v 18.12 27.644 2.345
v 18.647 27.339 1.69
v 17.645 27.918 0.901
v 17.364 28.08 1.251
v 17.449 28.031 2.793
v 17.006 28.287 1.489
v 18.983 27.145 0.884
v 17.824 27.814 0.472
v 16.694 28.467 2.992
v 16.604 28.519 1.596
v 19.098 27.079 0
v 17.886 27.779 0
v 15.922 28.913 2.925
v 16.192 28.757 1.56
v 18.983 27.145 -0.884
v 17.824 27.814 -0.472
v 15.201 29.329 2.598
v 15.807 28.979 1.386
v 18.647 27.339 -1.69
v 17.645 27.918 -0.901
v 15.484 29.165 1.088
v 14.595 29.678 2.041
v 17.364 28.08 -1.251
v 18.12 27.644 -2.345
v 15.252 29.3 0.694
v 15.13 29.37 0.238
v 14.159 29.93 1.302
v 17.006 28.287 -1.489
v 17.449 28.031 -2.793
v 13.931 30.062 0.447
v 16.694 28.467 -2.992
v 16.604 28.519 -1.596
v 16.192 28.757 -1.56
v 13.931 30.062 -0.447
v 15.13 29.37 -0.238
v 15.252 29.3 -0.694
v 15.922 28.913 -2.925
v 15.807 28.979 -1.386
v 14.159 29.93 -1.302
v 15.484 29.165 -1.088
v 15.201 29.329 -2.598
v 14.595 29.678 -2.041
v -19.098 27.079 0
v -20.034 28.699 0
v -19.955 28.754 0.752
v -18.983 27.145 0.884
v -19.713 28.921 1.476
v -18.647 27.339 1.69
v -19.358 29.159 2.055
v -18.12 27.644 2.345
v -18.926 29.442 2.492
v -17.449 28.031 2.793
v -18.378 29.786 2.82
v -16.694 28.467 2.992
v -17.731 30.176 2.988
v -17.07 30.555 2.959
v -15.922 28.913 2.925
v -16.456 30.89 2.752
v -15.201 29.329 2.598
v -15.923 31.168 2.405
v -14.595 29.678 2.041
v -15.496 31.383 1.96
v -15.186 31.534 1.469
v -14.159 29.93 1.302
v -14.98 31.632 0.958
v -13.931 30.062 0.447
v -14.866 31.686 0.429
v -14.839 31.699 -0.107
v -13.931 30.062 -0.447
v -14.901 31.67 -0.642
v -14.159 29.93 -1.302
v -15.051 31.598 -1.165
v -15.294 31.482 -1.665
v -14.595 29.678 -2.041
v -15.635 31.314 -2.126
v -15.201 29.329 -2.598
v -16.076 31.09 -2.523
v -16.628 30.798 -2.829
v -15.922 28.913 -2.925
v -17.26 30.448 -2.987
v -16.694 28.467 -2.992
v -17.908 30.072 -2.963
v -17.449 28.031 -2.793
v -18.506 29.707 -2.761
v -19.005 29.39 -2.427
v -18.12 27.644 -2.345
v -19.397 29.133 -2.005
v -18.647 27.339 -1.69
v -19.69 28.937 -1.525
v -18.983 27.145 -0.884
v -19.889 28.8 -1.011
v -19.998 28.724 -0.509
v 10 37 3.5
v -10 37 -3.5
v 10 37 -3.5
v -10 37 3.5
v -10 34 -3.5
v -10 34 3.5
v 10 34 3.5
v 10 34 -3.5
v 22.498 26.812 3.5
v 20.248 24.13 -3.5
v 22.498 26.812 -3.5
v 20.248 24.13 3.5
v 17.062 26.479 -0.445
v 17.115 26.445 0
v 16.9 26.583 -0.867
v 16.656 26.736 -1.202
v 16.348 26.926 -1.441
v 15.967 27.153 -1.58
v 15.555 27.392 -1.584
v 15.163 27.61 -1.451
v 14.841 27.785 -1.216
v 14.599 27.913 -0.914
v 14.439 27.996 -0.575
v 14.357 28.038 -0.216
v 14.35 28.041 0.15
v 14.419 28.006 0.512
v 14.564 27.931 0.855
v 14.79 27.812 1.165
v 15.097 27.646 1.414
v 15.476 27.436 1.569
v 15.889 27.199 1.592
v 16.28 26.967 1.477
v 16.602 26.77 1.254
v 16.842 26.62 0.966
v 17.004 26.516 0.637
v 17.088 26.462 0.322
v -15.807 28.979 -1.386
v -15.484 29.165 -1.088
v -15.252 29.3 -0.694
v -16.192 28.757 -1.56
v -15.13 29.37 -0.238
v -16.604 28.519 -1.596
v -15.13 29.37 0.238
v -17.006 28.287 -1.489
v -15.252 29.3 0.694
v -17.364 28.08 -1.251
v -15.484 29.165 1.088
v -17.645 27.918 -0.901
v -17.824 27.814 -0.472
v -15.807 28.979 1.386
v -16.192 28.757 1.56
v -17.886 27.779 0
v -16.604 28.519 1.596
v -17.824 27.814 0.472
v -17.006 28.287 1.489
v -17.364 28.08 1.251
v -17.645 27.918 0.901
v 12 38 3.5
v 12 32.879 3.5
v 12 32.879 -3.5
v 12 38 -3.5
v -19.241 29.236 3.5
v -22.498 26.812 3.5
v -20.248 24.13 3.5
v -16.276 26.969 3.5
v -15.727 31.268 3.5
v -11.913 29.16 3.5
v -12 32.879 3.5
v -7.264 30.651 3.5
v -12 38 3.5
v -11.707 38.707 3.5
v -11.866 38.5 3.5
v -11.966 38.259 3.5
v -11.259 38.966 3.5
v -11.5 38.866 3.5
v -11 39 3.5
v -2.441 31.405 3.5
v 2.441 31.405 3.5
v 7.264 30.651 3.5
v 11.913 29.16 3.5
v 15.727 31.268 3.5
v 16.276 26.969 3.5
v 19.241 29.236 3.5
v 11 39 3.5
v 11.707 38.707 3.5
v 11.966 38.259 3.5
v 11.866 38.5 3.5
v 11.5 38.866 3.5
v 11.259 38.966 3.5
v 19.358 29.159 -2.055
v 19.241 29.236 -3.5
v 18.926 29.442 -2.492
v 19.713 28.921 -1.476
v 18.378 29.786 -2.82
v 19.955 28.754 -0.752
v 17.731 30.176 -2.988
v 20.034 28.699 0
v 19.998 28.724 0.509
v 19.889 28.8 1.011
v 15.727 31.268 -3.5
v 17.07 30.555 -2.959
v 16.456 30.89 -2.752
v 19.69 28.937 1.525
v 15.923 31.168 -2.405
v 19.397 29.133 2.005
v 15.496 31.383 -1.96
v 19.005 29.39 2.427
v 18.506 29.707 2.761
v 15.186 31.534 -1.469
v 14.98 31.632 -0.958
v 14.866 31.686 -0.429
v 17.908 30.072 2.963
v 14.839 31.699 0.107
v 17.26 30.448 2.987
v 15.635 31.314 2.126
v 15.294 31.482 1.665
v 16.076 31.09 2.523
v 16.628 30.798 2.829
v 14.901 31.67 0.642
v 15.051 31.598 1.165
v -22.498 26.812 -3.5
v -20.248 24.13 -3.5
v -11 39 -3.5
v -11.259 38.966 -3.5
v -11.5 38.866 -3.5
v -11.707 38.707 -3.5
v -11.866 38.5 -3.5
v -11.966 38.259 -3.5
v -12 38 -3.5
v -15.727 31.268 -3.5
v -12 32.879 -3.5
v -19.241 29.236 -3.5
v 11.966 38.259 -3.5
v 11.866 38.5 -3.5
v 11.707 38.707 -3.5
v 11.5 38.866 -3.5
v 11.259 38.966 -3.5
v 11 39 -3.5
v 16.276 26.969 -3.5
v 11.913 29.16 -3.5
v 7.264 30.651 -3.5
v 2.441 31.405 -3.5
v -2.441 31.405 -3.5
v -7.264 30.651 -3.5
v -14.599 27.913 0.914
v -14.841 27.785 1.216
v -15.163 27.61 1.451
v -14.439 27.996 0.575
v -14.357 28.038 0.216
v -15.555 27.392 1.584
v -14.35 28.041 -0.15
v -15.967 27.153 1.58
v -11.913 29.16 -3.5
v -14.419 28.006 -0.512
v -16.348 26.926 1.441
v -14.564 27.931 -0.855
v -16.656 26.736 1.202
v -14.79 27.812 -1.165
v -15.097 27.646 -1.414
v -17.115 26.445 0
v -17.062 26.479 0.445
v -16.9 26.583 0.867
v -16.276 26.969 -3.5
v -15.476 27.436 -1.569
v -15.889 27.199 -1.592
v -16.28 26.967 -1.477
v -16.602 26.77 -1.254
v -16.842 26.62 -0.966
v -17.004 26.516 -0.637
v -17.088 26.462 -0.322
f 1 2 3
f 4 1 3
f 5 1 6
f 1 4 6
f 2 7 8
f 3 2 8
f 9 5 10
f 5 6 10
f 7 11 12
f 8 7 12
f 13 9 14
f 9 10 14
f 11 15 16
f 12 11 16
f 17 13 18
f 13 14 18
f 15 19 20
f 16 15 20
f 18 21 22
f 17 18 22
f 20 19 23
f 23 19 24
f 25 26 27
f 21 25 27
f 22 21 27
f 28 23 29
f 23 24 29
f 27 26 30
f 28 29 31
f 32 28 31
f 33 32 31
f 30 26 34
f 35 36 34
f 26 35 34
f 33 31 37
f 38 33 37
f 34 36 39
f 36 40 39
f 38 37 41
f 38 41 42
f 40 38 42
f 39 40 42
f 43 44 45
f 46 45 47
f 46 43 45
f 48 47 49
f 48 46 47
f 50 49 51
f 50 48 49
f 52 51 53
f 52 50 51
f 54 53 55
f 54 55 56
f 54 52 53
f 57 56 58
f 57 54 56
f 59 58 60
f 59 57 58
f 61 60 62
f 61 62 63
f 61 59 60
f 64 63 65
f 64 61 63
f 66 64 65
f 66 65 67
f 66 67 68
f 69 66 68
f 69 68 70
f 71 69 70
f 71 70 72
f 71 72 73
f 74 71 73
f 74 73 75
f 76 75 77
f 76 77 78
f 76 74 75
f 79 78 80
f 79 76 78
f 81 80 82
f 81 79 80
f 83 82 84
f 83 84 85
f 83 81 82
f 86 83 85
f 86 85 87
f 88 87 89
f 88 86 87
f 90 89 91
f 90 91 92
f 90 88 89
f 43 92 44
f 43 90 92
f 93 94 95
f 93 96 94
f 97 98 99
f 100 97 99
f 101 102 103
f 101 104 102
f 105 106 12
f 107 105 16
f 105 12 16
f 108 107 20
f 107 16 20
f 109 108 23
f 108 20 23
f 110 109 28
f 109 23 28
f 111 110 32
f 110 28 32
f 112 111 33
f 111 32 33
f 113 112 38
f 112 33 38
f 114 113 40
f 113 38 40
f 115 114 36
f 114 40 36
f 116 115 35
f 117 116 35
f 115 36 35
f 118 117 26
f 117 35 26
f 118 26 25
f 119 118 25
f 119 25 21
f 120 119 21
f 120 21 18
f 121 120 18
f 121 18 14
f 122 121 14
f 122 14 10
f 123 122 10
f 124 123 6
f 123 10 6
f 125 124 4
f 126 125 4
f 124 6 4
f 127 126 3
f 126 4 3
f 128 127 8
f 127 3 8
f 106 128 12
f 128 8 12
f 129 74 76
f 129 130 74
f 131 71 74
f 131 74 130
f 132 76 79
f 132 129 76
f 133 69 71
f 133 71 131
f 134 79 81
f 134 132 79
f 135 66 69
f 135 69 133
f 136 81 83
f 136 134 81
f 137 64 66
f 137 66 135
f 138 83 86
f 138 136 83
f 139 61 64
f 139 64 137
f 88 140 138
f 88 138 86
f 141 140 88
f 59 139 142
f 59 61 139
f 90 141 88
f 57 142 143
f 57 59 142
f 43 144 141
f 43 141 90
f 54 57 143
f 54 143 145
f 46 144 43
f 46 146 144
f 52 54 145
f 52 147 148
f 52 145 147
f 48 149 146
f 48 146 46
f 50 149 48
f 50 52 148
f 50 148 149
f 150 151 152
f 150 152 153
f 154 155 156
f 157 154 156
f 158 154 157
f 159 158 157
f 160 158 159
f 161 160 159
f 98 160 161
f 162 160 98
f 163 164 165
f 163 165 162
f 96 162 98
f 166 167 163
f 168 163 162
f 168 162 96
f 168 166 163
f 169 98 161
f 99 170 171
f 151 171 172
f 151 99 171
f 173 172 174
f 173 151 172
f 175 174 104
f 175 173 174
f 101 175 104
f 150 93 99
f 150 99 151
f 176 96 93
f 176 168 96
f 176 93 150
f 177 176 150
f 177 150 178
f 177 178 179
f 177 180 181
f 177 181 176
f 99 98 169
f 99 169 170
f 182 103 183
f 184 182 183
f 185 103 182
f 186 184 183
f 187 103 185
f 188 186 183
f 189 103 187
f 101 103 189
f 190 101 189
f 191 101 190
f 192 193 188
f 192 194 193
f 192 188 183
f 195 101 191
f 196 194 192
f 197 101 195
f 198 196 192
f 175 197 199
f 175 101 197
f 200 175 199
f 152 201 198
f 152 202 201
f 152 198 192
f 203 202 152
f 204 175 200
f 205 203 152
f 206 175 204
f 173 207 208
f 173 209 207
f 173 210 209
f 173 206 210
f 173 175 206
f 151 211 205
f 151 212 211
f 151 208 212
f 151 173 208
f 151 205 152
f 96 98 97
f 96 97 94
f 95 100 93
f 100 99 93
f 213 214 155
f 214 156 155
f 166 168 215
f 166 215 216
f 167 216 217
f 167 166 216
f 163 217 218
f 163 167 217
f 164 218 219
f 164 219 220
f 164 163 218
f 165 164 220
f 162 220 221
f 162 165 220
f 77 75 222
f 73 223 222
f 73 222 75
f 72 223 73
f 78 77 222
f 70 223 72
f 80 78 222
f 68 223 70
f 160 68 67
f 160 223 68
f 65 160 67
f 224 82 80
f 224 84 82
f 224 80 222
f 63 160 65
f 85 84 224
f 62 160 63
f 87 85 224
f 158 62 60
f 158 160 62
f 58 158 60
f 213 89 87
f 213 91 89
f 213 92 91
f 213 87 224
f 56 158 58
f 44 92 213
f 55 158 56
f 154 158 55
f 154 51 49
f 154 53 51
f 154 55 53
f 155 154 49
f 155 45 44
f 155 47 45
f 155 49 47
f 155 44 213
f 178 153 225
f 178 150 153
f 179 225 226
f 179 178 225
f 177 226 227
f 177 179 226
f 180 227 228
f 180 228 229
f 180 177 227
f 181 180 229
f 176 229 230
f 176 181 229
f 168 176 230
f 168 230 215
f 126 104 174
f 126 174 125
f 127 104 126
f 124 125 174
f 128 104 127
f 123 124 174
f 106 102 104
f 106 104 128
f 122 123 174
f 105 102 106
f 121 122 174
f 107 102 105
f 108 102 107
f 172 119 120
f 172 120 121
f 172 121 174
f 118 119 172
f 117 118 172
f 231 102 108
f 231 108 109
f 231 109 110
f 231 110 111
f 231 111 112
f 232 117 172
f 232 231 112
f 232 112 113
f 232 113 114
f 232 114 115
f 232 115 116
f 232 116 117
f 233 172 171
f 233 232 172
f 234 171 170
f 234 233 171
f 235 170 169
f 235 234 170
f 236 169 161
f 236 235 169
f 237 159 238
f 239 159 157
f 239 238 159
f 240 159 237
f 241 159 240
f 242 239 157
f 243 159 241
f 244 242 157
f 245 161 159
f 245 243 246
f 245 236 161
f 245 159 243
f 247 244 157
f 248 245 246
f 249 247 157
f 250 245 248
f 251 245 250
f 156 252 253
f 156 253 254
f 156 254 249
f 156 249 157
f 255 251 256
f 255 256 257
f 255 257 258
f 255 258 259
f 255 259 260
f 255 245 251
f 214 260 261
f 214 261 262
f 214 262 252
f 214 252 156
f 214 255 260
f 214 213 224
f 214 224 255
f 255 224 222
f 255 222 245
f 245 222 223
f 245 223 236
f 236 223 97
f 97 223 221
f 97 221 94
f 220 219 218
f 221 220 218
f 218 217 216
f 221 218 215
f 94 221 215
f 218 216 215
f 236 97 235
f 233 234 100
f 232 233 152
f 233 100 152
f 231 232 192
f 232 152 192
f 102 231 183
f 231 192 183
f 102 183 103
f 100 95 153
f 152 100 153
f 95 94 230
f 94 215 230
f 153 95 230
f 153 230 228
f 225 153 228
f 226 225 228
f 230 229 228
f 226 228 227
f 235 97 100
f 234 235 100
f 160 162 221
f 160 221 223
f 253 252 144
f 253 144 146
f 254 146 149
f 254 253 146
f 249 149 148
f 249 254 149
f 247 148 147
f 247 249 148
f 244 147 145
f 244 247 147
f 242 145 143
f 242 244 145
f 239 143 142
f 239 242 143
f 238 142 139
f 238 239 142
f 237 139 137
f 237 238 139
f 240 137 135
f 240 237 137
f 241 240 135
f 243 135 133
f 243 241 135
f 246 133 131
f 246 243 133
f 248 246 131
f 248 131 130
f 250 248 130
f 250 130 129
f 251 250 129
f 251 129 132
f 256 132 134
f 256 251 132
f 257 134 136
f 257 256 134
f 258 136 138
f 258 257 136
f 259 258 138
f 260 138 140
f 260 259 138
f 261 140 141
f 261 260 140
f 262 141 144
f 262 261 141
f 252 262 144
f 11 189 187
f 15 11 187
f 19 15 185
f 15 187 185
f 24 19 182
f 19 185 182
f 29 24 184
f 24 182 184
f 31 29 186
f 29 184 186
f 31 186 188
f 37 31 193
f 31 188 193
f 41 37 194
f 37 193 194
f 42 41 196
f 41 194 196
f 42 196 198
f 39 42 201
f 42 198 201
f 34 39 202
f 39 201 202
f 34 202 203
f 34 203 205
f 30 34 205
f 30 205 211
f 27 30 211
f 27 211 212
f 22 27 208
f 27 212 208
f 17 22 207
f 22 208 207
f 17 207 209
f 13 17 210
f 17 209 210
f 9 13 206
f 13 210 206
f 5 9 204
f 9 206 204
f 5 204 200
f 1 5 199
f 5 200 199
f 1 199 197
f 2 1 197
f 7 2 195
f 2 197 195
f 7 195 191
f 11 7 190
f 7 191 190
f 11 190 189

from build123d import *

# Parameters (mm, degrees)
F0_R      = 35
F0_R_2    = 31.5
F1_DEPTH  = 3.5
F2_W      = 20
F2_H      = 3
F3_DEPTH  = 3.5
F4_DEPTH  = 12.5
F9_W      = 10.4753747582
F9_H      = 9.4332345761
F10_ANGLE = 280


# Not quite as in the source:
# - a feature names something its author has since deleted; it is built from what else it names


with BuildPart() as f1:
    # F0 (on Top) → F1 (new body, symmetric)
    with BuildSketch(Plane.XY):
        Circle(F0_R)
        Circle(F0_R_2, mode=Mode.SUBTRACT)
    extrude(amount=F1_DEPTH, both=True)

    # F2 (on Top) → F3 (join, symmetric)
    with BuildSketch(Plane.XY):
        with BuildLine():
            ThreePointArc((12, 38), (11.7071067812, 38.7071067812), (11, 39))
            Line((11, 39), (-11, 39))
            ThreePointArc((-11, 39), (-11.7071067812, 38.7071067812), (-12, 38))
            Line((-12, 38), (-12, 31.5))
            Line((-12, 31.5), (12, 31.5))
            Line((12, 31.5), (12, 38))
        make_face()
        with Locations((0, 35.5)):
            Rectangle(F2_W, F2_H, mode=Mode.SUBTRACT)
    extrude(amount=F3_DEPTH, both=True)

    # F2 (on Top) → F4 (cut, symmetric)
    with BuildSketch(Plane.XY):
        with Locations((0, 35.5)):
            Rectangle(F2_W, F2_H)
    extrude(amount=F4_DEPTH, both=True, mode=Mode.SUBTRACT)

    # F9 (on face) → F10 (revolve, cut)
    with BuildSketch(Plane(origin=(0, 0, 0), x_dir=(0.6427876097, 0.7660444431, 0), z_dir=(0.7660444431, -0.6427876097, 0))):
        with Locations((33.1802591681, -0.398933189)):
            Rectangle(F9_W, F9_H)
    revolve(axis=Axis((0, 0, 0), (0, 0, -1)), revolution_arc=F10_ANGLE, mode=Mode.SUBTRACT)

    # F5 (on Top) → F11 (revolve, cut)
    with BuildSketch(Plane.XY):
        Polygon((16.5, 28.5788383249), (17.8856406461, 27.7788383249), (19.0980762114, 27.0788383249), (20.7630293139, 29.9626216907), (18.1649531025, 31.4626216907), align=None)
        Polygon((16.0922047839, 24.6725162916), (17.8856406461, 27.7788383249), (16.5, 28.5788383249), (14.7065641379, 25.4725162916), align=None)
    revolve(axis=Axis((15.0315794057, 26.0354592487, 0), (0.5, 0.8660254038, 0)), mode=Mode.SUBTRACT)

    # F6 (on Top) → F12 (revolve, cut)
    with BuildSketch(Plane.XY):
        Polygon((-19.0980762114, 27.0788383249), (-17.8856406461, 27.7788383249), (-16.5, 28.5788383249), (-17.8281544713, 30.8792693496), (-20.4262306827, 29.3792693496), align=None)
        Polygon((-16.5, 28.5788383249), (-17.8856406461, 27.7788383249), (-16.1036535179, 24.6923460805), (-14.7180128719, 25.4923460805), align=None)
    revolve(axis=Axis((-13.6687379183, 23.6749485498, 0), (-0.5, 0.8660254038, 0)), mode=Mode.SUBTRACT)


solid = f1.part
